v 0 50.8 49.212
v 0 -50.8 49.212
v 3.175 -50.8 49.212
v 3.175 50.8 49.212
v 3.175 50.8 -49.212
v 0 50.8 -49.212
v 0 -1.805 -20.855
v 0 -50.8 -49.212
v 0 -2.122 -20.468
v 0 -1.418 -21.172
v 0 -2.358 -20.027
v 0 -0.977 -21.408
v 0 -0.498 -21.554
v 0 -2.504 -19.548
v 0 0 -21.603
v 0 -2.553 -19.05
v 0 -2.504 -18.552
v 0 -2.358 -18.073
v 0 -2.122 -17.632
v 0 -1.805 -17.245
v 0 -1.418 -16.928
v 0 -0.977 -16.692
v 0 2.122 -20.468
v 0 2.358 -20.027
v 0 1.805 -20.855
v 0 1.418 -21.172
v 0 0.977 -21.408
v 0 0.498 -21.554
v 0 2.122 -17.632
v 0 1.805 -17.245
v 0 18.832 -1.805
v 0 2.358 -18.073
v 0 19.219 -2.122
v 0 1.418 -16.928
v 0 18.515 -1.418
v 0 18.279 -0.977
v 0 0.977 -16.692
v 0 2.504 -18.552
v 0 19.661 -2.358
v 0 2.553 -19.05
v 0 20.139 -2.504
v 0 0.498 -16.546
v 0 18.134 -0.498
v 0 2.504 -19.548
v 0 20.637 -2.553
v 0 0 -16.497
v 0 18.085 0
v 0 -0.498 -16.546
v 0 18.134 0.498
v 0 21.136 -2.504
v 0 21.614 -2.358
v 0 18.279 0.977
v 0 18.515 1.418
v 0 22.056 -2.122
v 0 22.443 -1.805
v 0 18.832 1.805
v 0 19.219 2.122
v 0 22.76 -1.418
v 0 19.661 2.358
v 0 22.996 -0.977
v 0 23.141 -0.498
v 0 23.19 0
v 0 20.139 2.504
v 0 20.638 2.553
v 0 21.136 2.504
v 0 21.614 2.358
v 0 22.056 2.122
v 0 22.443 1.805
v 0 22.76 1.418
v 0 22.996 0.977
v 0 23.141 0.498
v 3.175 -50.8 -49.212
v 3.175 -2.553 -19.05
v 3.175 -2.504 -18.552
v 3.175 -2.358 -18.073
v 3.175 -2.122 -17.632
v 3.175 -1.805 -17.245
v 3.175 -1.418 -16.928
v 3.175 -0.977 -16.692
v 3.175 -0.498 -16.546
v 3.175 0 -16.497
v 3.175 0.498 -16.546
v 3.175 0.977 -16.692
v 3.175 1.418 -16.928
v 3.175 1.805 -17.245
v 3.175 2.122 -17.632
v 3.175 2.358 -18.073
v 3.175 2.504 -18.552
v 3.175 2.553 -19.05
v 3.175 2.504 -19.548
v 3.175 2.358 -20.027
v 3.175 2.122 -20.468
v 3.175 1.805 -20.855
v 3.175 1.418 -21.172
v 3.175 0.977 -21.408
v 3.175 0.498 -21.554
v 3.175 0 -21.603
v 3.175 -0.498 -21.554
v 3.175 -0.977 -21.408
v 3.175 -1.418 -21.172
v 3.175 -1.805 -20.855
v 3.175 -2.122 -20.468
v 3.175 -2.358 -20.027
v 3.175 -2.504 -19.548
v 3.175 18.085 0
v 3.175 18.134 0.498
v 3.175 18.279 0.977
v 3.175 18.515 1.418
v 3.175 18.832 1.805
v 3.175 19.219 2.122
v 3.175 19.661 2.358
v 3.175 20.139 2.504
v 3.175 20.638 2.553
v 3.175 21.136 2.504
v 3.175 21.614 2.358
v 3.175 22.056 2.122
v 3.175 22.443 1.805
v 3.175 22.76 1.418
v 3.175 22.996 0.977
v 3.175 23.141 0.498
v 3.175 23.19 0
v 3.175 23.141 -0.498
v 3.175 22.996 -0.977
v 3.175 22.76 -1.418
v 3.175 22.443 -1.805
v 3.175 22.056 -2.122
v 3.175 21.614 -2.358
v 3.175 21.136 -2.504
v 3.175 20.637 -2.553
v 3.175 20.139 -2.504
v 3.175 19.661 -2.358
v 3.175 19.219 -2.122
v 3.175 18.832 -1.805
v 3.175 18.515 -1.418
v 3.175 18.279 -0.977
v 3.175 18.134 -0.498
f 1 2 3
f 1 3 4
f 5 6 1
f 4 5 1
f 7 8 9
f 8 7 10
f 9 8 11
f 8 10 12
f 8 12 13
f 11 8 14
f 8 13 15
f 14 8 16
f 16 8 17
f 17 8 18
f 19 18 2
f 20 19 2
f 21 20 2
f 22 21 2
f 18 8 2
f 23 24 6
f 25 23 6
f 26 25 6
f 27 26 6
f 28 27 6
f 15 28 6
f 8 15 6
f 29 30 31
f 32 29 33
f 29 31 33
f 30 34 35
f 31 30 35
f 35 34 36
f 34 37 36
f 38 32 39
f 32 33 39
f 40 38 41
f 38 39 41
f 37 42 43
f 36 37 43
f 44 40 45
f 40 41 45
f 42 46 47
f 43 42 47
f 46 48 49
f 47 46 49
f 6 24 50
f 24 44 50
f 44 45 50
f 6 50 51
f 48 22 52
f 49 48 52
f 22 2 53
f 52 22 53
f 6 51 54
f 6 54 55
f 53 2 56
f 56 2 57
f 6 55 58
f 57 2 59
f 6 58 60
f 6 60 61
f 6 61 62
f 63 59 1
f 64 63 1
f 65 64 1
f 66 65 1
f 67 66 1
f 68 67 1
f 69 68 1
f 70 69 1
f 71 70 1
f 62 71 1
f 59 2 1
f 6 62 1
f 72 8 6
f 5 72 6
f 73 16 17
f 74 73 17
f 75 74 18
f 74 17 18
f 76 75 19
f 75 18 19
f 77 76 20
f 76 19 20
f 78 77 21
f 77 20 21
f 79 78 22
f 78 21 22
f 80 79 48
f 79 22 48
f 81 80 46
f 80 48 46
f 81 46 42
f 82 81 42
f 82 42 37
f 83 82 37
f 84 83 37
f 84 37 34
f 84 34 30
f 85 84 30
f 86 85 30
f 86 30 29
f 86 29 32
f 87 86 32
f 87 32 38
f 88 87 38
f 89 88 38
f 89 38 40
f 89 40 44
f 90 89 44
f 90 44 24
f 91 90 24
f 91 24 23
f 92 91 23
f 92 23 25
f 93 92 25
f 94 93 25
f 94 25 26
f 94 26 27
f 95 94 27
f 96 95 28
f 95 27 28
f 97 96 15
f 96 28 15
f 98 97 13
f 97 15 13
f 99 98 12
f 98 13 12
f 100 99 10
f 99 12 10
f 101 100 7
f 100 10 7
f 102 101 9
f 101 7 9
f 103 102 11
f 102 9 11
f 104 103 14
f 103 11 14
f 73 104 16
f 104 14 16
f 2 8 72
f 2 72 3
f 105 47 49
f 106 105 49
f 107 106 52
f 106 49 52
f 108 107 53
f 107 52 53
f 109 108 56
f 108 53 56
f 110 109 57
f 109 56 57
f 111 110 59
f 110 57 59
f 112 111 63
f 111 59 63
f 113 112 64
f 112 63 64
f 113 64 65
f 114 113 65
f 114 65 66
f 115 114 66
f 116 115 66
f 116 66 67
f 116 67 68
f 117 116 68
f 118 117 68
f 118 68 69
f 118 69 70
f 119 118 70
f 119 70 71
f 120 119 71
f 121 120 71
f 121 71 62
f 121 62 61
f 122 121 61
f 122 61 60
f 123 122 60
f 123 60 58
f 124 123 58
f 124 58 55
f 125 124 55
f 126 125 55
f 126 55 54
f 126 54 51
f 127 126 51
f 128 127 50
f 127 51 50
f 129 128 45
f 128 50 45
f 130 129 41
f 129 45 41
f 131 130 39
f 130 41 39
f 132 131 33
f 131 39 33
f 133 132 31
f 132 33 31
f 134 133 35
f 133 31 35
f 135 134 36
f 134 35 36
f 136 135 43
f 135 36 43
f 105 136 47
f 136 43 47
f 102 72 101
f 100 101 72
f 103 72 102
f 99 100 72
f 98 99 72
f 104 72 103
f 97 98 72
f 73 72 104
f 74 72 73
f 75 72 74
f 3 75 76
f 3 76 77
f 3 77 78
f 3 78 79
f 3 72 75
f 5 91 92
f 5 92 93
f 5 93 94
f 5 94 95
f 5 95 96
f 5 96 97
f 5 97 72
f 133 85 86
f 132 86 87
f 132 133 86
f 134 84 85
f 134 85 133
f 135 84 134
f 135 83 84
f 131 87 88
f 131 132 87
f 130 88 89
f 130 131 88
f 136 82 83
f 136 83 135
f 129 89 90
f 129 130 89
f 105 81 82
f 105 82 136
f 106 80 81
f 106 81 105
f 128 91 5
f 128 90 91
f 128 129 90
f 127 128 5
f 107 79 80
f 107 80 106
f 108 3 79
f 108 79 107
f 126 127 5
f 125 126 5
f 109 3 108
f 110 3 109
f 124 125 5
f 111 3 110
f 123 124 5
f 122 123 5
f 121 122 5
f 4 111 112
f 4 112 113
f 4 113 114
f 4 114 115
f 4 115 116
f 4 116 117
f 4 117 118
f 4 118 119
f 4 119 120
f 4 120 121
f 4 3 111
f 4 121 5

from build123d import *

# Parameters (mm, degrees)
F0_W     = 101.6
F0_H     = 98.425
F1_DEPTH = 3.175
F3_D     = 5.1054
F3_DEPTH = 25
F3_TIP   = 1.5338169022


# Not quite as in the source:
# - a length typed as a fraction of an inch, garbled in the dataset ("3 / 203.2 mm" for 3/8 in), is restored


with BuildPart() as f1:
    # F0 (on Right) → F1 (new body)
    with BuildSketch(Plane.YZ):
        Rectangle(F0_W, F0_H)
    extrude(amount=F1_DEPTH)

    # F3
    with Locations(Plane.YZ.offset(3.175)):
        with Locations((0, -19.05), (20.6375, 0)):
            Hole(F3_D / 2, depth=F3_DEPTH)
            with Locations((0, 0, -(F3_DEPTH + F3_TIP / 2))):  # 118° drill point
                Cone(0, F3_D / 2, F3_TIP, mode=Mode.SUBTRACT)


solid = f1.part
